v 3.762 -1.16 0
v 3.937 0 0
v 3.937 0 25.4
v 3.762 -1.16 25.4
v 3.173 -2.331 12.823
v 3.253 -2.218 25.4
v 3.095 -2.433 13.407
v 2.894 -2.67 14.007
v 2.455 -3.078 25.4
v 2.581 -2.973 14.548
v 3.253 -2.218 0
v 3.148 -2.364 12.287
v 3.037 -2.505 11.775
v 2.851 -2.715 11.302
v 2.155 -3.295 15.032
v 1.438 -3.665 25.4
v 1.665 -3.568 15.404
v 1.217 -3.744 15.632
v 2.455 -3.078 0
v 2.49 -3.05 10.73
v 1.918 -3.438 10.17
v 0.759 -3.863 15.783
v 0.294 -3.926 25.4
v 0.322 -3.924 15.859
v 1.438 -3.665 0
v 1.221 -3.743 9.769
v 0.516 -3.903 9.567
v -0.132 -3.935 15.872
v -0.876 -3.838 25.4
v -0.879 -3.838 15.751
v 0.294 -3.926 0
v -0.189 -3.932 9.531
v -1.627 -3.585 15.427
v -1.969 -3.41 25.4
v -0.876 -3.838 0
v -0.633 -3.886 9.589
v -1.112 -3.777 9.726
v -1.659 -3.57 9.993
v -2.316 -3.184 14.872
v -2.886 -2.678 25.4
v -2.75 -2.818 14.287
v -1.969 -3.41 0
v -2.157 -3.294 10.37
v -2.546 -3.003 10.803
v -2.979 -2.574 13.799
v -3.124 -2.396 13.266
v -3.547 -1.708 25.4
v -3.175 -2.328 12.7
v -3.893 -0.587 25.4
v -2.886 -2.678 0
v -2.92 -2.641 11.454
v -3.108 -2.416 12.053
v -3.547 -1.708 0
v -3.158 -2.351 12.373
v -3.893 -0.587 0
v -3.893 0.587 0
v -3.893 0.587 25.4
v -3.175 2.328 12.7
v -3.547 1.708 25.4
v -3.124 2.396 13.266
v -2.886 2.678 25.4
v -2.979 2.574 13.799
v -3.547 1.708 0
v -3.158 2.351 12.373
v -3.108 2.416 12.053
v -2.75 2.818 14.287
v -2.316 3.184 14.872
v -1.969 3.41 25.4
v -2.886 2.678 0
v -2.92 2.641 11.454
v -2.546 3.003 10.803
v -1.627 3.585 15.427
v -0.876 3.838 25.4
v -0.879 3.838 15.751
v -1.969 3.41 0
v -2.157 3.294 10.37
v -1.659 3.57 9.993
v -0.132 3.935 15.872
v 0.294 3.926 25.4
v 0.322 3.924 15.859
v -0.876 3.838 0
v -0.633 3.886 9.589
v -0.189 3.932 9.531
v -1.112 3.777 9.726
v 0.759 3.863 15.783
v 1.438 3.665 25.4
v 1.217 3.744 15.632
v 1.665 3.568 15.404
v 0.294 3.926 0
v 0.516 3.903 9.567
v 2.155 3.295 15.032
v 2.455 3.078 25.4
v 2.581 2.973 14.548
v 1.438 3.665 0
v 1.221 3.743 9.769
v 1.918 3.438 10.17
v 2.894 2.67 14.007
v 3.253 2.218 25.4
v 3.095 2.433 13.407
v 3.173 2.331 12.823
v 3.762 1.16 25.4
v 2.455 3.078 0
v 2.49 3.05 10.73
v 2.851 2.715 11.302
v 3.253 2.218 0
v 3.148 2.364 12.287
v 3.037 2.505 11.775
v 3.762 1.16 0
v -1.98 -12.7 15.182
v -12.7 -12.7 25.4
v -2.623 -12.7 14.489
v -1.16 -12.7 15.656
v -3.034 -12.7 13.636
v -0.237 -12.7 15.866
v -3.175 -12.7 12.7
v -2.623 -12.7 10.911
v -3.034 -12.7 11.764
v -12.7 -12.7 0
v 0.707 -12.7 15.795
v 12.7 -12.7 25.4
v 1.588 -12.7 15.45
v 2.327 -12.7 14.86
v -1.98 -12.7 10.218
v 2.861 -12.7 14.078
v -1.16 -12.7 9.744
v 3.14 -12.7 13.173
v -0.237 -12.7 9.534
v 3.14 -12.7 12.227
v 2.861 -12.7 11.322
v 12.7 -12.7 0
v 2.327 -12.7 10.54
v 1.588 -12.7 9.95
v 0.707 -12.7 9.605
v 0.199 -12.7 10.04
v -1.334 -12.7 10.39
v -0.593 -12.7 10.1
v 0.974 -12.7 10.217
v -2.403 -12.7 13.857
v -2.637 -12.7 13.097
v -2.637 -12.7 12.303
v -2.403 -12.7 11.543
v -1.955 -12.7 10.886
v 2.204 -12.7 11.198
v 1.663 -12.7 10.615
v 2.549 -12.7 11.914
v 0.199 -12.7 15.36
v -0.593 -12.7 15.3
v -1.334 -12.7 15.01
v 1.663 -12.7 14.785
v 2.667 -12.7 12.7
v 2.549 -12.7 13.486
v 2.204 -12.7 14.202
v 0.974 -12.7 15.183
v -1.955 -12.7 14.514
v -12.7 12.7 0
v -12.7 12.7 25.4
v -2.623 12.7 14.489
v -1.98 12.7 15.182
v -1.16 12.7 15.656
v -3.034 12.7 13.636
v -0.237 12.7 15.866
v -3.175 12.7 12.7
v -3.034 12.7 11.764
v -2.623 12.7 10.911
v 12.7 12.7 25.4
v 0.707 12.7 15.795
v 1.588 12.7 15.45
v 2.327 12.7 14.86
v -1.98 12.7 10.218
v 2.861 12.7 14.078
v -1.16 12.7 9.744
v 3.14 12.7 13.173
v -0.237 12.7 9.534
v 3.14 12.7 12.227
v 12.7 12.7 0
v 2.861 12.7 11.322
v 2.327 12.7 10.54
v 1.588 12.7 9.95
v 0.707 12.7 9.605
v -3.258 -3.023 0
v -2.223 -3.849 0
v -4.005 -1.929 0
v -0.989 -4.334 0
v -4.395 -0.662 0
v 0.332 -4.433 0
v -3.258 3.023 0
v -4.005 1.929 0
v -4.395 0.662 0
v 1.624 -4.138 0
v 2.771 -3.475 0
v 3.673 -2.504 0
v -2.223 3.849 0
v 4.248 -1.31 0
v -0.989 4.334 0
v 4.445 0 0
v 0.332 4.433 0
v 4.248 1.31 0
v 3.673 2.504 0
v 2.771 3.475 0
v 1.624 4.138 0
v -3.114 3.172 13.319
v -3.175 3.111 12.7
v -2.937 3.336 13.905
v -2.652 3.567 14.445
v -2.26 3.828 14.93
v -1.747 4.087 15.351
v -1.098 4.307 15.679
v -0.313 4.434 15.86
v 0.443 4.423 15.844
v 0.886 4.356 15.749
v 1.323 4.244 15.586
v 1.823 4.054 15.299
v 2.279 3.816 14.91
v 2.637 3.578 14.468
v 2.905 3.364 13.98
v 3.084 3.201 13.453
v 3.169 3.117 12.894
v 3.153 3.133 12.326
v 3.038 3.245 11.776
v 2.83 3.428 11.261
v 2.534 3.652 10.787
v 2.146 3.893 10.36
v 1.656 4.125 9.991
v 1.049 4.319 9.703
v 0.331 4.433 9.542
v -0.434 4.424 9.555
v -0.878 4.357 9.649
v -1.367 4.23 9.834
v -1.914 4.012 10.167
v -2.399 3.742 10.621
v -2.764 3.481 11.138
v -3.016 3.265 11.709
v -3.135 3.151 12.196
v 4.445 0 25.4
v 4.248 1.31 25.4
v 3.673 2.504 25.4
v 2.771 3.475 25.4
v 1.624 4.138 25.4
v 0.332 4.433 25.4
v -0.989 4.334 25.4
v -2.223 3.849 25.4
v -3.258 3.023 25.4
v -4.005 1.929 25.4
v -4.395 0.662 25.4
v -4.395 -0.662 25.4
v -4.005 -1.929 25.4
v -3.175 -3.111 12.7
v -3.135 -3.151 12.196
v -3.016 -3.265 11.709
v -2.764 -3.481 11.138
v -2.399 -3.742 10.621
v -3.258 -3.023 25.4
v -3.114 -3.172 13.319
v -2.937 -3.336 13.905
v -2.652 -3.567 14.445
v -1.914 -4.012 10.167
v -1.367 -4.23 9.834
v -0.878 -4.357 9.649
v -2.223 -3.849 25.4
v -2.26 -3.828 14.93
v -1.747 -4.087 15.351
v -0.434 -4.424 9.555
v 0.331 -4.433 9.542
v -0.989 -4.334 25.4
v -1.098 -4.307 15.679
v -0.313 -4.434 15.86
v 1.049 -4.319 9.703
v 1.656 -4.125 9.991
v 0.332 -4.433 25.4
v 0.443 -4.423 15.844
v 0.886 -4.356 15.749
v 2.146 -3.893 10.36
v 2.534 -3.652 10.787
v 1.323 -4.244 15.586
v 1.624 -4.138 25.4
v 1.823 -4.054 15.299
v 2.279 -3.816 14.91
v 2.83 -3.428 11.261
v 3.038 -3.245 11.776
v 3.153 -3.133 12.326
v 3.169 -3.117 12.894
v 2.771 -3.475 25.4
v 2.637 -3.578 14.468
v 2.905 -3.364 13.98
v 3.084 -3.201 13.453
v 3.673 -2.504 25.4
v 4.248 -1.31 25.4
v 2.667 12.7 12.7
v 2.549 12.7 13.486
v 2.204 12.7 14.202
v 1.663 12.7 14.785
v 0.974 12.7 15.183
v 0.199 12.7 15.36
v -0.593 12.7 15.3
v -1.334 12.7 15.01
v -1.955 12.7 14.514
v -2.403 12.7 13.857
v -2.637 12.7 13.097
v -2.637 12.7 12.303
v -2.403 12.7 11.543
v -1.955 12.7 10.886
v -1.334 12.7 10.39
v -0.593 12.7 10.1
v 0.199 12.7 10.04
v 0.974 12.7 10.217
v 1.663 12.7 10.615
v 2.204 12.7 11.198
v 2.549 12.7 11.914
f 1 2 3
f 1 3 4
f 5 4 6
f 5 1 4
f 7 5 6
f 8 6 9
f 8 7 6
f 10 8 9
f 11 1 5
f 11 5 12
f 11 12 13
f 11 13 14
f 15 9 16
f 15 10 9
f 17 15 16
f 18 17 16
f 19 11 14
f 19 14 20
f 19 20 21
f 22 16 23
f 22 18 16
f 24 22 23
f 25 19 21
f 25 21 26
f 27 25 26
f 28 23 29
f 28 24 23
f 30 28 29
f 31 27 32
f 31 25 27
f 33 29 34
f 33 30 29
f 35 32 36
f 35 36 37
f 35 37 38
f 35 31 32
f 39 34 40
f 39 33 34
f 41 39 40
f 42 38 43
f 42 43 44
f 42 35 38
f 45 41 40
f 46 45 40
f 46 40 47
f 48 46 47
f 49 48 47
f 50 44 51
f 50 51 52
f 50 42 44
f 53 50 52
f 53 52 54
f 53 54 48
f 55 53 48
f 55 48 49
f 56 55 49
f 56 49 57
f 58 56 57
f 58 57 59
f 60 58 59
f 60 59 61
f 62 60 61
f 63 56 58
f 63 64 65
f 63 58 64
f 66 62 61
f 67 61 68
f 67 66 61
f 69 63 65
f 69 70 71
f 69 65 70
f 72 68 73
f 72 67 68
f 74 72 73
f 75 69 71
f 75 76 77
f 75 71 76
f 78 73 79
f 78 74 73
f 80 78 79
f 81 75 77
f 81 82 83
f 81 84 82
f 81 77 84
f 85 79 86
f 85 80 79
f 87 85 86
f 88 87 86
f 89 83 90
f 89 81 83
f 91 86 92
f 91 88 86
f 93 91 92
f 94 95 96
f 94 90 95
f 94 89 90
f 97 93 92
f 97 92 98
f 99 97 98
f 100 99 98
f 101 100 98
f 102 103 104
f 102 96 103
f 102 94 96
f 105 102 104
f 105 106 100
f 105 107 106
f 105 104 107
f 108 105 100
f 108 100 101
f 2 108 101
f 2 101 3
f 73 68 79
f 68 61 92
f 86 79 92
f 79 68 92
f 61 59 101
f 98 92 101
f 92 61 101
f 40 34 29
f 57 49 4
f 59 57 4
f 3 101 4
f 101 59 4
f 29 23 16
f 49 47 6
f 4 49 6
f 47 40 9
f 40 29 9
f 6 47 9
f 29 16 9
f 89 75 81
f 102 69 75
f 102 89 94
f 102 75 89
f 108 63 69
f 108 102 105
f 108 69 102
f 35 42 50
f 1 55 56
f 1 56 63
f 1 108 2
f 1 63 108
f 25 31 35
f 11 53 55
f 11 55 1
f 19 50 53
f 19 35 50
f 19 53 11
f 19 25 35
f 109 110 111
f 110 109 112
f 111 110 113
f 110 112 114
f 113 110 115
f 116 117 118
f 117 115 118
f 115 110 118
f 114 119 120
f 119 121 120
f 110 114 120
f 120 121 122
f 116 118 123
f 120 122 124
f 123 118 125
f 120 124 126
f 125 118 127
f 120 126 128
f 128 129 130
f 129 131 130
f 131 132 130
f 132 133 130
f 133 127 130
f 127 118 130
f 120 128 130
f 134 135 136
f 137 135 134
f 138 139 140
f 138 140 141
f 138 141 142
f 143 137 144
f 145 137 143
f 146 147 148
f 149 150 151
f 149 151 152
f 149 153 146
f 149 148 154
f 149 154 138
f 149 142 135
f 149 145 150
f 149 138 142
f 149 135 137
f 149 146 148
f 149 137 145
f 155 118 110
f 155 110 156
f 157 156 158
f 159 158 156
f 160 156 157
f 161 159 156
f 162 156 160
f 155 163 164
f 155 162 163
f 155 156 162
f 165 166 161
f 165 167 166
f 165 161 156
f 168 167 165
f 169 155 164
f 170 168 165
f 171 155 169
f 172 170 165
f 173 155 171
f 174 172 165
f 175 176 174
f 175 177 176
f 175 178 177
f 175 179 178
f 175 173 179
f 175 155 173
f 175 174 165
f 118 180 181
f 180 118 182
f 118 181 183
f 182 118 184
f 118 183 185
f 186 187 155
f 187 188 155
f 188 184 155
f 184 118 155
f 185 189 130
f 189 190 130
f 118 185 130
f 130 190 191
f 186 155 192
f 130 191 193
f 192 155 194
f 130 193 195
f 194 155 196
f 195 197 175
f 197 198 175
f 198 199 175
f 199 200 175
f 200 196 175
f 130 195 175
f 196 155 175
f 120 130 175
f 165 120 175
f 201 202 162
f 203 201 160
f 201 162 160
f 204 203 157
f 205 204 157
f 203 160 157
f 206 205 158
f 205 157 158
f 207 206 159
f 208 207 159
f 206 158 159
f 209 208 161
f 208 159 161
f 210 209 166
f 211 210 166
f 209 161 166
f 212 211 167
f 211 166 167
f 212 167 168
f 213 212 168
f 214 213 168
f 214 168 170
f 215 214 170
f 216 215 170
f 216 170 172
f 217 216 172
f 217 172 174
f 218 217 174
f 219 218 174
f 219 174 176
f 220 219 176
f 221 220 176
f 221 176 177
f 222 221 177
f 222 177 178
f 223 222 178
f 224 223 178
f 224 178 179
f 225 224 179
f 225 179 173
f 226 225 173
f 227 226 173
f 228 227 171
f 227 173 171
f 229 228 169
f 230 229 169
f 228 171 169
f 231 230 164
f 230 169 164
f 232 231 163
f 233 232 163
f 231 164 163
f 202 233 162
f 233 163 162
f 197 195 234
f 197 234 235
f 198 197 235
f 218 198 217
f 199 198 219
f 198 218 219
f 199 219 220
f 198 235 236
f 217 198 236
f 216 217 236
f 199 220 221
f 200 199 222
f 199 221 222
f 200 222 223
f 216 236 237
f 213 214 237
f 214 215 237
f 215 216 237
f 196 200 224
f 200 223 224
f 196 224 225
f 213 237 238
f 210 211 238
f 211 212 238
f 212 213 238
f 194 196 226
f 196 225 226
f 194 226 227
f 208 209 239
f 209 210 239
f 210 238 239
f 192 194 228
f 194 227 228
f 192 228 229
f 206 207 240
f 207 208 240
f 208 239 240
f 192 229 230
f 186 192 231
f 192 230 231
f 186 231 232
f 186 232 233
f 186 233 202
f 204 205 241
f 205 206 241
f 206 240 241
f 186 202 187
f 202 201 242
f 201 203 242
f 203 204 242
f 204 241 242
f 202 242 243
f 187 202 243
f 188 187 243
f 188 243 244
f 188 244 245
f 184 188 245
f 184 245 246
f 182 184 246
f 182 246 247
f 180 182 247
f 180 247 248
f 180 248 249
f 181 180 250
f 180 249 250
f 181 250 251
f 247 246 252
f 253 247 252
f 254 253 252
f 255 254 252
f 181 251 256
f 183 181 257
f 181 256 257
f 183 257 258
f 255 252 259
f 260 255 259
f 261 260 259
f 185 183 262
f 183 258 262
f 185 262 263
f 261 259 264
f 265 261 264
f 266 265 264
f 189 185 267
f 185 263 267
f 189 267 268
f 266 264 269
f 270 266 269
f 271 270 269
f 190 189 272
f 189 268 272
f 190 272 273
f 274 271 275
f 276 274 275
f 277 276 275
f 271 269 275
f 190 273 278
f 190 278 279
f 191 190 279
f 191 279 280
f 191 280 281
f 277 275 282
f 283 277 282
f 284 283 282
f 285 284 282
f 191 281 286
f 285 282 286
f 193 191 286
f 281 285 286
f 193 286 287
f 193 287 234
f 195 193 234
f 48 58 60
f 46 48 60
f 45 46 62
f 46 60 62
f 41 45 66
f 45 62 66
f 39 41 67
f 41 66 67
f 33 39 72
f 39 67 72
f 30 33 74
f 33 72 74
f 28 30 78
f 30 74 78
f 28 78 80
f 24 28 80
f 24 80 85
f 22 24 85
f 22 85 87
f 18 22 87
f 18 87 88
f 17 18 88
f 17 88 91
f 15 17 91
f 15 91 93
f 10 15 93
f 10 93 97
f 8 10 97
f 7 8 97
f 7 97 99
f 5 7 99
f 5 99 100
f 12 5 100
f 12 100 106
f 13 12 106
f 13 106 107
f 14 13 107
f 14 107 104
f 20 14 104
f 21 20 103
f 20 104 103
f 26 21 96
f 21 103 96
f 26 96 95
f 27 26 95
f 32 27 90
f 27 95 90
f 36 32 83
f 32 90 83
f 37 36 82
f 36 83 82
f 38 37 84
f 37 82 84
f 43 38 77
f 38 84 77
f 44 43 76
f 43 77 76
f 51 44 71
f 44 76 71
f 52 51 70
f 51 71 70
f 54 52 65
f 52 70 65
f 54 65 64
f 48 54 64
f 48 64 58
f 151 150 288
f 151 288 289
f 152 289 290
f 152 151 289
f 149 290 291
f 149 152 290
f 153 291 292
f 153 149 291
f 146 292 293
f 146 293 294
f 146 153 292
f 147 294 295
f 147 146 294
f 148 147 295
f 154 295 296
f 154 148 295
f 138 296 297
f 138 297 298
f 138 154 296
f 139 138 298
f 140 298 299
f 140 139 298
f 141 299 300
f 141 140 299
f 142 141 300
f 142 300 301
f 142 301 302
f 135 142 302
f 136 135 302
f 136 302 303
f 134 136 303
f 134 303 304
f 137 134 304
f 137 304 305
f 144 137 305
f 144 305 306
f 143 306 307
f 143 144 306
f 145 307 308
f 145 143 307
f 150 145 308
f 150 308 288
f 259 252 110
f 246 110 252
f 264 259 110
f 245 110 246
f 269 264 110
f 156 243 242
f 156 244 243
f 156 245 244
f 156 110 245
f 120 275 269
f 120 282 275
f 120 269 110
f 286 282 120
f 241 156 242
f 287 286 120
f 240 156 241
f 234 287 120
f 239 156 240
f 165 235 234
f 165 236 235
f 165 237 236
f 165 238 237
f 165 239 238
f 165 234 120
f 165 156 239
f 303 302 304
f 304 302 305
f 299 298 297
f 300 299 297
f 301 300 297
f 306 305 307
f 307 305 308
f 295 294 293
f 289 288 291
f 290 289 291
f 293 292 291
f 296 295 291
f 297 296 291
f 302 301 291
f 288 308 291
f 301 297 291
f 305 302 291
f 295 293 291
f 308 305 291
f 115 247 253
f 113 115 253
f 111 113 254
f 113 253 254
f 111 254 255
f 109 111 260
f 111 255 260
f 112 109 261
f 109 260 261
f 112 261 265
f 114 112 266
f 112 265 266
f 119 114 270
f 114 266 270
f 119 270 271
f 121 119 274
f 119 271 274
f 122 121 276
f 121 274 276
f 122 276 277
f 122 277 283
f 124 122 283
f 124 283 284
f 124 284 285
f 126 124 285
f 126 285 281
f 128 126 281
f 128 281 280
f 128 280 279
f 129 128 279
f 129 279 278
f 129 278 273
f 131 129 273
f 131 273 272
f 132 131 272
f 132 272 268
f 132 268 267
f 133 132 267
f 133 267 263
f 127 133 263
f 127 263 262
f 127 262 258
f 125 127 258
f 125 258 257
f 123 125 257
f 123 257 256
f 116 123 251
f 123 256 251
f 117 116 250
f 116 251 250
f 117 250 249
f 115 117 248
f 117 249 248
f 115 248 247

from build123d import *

# Parameters (mm, degrees)
F0_W     = 25.4
F0_H     = 25.4
F1_DEPTH = 25.4
F2_R     = 4.445
F3_DEPTH = 25.401
F5_R     = 3.937
F6_DEPTH = 25.4
F4_R     = 3.175
F7_DEPTH = 25.401
F8_R     = 2.667
F9_DEPTH = 25.4


with BuildPart() as f1:
    # F0 (on Top) → F1 (new body)
    with BuildSketch(Plane.XY):
        Rectangle(F0_W, F0_H)
    extrude(amount=F1_DEPTH)

    # F2 (on face) → F3 (cut, through all)
    with BuildSketch(Plane.XY.offset(25.4)):
        Circle(F2_R)
    extrude(amount=-F3_DEPTH, mode=Mode.SUBTRACT)


with BuildPart() as f6:
    # F5 (on face) → F6 (new body, through all)
    with BuildSketch(Plane(origin=(0, 0, 0), x_dir=(1, 0, 0), z_dir=(0, 0, -1))):
        Circle(F5_R)
    extrude(amount=-F6_DEPTH)


with BuildPart() as f7_tool:
    # F4 (on face) → F7 (new body, through all)
    with BuildSketch(Plane(origin=(0, 12.7, 0), x_dir=(-1, 0, 0), z_dir=(0, 1, 0))):
        with Locations((0, 12.7)):
            Circle(F4_R)
    extrude(amount=-F7_DEPTH)


with BuildPart() as f1_1:
    add(f1.part)

    # F7: cut by f7_tool
    add(f7_tool.part, mode=Mode.SUBTRACT)


with BuildPart() as f6_1:
    add(f6.part)

    # F7: cut by f7_tool
    add(f7_tool.part, mode=Mode.SUBTRACT)


with BuildPart() as f9:
    # F8 (on face) → F9 (new body, through all)
    with BuildSketch(Plane.XZ.offset(12.7)):
        with Locations((0, 12.7)):
            Circle(F8_R)
    extrude(amount=-F9_DEPTH)


solid = Compound([f1_1.part, f6_1.part, f9.part])
